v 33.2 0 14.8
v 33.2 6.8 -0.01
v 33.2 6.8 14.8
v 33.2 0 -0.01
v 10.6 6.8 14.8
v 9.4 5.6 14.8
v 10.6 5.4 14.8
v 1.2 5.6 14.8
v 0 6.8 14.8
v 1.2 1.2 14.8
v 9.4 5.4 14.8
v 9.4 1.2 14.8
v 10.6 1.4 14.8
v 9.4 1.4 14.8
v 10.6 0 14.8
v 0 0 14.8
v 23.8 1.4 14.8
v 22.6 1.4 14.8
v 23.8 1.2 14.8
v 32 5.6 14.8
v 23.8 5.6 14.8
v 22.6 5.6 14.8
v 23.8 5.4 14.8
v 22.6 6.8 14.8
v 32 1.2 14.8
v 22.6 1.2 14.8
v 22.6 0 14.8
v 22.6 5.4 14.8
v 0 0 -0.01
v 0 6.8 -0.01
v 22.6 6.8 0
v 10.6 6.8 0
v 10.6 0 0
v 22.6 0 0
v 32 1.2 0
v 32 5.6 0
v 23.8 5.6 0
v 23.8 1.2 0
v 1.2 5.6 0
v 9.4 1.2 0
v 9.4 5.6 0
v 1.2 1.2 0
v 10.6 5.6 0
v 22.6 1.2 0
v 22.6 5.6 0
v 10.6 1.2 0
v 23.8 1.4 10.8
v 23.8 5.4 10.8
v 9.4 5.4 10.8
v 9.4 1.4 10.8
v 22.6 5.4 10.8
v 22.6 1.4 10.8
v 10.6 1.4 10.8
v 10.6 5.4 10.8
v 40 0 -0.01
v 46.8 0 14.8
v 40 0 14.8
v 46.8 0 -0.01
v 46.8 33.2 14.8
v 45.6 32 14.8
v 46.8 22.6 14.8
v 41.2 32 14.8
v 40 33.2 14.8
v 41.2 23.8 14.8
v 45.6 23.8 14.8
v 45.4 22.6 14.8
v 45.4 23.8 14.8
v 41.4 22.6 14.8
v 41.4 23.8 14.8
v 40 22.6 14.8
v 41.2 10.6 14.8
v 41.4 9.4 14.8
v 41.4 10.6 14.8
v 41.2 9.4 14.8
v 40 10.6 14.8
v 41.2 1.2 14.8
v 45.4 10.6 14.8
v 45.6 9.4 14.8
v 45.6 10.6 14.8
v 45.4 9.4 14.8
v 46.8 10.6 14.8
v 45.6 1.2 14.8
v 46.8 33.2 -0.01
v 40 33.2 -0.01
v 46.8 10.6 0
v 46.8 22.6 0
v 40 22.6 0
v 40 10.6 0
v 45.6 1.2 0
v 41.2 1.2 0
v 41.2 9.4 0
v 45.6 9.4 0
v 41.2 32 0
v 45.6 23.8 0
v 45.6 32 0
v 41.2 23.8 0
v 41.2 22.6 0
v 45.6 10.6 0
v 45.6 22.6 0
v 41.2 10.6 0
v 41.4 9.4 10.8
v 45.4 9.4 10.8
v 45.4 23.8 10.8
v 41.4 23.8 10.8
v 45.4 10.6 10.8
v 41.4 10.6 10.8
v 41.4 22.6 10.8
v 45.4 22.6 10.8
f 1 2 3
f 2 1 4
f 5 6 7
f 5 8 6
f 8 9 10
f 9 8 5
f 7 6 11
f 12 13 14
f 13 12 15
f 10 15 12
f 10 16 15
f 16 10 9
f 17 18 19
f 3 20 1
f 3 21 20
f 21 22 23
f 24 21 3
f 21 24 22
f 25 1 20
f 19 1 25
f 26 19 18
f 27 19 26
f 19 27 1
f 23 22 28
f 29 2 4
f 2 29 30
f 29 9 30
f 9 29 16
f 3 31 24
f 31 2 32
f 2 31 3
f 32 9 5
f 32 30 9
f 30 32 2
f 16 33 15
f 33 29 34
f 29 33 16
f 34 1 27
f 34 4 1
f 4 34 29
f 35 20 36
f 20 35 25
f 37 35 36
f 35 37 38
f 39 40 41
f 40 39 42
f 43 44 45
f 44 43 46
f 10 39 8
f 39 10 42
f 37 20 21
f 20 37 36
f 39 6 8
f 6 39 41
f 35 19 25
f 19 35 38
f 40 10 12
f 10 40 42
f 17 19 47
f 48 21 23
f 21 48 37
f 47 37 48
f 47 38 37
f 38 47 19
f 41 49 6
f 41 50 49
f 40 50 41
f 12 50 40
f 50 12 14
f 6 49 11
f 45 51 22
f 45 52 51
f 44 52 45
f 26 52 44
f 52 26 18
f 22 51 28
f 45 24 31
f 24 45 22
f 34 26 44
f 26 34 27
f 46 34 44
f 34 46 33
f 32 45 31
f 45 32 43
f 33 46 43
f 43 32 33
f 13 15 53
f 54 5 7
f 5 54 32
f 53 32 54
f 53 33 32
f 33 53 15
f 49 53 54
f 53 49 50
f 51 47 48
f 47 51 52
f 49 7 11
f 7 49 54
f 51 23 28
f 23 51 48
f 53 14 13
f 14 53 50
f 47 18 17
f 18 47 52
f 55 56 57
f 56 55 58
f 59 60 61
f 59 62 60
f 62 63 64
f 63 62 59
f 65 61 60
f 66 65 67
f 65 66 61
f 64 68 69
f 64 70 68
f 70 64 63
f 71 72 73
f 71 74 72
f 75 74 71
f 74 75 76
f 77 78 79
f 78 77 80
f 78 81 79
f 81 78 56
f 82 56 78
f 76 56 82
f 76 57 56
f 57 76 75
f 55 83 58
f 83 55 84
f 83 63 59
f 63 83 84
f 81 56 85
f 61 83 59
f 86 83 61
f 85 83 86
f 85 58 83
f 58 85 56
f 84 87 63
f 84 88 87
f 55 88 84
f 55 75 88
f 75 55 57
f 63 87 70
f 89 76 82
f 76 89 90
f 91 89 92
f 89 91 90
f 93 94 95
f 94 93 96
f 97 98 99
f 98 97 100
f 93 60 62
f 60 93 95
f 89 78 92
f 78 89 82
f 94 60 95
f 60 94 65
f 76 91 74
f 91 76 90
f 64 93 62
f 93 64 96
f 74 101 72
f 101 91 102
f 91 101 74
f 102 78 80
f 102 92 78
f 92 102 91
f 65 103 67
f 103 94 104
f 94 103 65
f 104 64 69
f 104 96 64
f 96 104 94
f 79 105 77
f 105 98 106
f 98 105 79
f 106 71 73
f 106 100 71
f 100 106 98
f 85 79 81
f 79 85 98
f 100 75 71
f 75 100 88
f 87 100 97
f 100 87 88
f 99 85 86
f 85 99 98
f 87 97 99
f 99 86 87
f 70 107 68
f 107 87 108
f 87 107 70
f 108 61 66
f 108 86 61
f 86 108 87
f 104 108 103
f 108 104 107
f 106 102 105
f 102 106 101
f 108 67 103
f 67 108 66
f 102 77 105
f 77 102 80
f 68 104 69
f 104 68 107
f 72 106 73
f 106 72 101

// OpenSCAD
// file: ../../Base/Boxes.scad
// Fischertechnik Box Foundation
// Pre-designed Boxes

use <Constants.scad>

include <PlacementOptions.scad>

box190Width = 190;
box190Depth = 130;
box130Width = 130;
box130Depth = 95;
boxUsageHeight = 33.9;
boxWallThickness = 2.4;
boxBaseThickness = 1.0;

// getBoxWallThickness()
// Gets the wall thickness of a Fischertechnik Box

function getBoxWallThickness() = boxWallThickness;

// Gets the usable height of a fischertechnik box
function getBoxUsageHeight() = boxUsageHeight;

// Gets the thickness of the Fischertechnik box base.
function getBoxBaseThickness() = boxBaseThickness;

// Gets the usable inner space of a Box 190 as an x/y-list
function getBox190Space() = [
    box190Width - 2*getBoxWallThickness(), 
    box190Depth - 2*getBoxWallThickness() ];

// Imports the Fischertechnik empty box 130x190 mm and places it at position 0,0
// 190x130 are the outer sizes, the inner space is slightly smaller. Use getBox190Space() to get the inner sizes.
// This module needs the STL file "Fischertechnik Box 130x190.stl" in the library path.
// The box is positioned that the usable inner space is at the 0,0,0 position. The

module Box190() {
    translate([-getBoxWallThickness(),-getBoxWallThickness(),-getBoxBaseThickness()])
        import("Fischertechnik Box 130x190.stl", convexity=3);
}

// Gets the usable inner space of a Box 130 as an x/y-list
function getBox130Space() = [
    box130Width - 2*getBoxWallThickness(), 
    box130Depth - 2*getBoxWallThickness() ];

// Imports the Fischertechnik empty box 95x130 mm and places it at position 0,0
// 190x130 are the outer sizes, the inner space is slightly smaller. Use getBox190Space() to get the inner sizes.
// This module needs the STL file "Fischertechnik Box 95x130.stl" in the library path.
// The box is positioned that the usable inner space is at the 0,0,0 position. The

module Box130() {
    translate([-getBoxWallThickness(),-getBoxWallThickness(),-getBoxBaseThickness()])
        import("Fischertechnik Box 95x130.stl", convexity=3);
}

// Creates a web at the specified box walls
// corner 0 = LowerLeft, 1 = UpperLeft, 2 = UpperRight, 3 = LowerRight
// side 0 = LeftOfCorner, 1 = RightOfCorner
// distance = Distance in mm from the corner
// box = inner width and depth of the box (default: Box 190)
// webWidth = length of the web (default is 3 mms)
// webThickness = thickness of the web (default is 1 mm)

module BoxWeb(corner, side, distance, box=getBox190Space(), webWidth=3, webThickness=1.0) {
    sink = getBoxWallThickness()/2;

    width = (corner % 2 == 0) ? 
            (side == LeftOfCorner ? webWidth : webThickness) :
            (side == LeftOfCorner ? webThickness : webWidth);

    depth = (corner % 2 == 0) ? 
            (side == RightOfCorner ? webWidth : webThickness) :
            (side == RightOfCorner ? webThickness : webWidth);
    
    xDiff = corner == LowerLeft ? 
                (side == LeftOfCorner ? -sink : distance) :
            (corner == UpperLeft ?                
                (side == LeftOfCorner ? distance : -sink) :
            (corner == UpperRight ?
                (side == LeftOfCorner ? box.x-webWidth+sink : box.x-distance-webThickness) :
                (side == LeftOfCorner ? box.x-distance-webThickness: box.x-webWidth+sink)));

    yDiff = corner == LowerLeft ? 
                (side == RightOfCorner ? -sink : distance) :
            (corner == UpperLeft ?
                (side == RightOfCorner ? box.y-distance : box.y-webWidth+sink) :
            (corner == UpperRight ?
                (side == RightOfCorner ? box.y-webWidth+sink : box.y-distance) :
                (side == RightOfCorner ? distance : -sink)));
    
    translate([xDiff, yDiff, -getExcess()])
        cube([width, depth, boxUsageHeight + 2*getExcess()]);
}
// file: ../../Base/Rotation.scad
// Fischertechnik Box Foundation
// Geometry Helpers Rotation

include <PlacementOptions.scad>

// getRotatedSpace(space, rotation=NoRotation)
// Rotates the space dependent on the specified rotation

function getRotatedSpace(space, rotation=NoRotation) = [
    (rotation == Rotate90 || rotation == Rotate270) ? space.y : space.x,
    (rotation == Rotate90 || rotation == Rotate270) ? space.x : space.y
];

// Rotates the given space around the fixed left lower corner
// space = the space the children needs as width/depth list [width,depth]
// rotation = 0 Rotate0 degrees, 1 Rotate90 degrees, 2 Rotate180 degrees, 3 Rotate270 degrees (equivalent to -90)

module RotateFix(space, rotation=Rotate0) {
    dy = (rotation == Rotate0 || rotation == Rotate270) ? 0 :
        (rotation == Rotate90) ? space.x :
        space.y;
    dx = (rotation < Rotate180) ? 0 :
        (rotation == Rotate180) ? space.x :
        space.y;
    
    translate([dx, dy, 0])
        rotate([0, 0, rotations[rotation]])
            children();
}
// file: ../../Base/Alignment.scad
// Fischertechnik Box Foundation
// Geometry Helpers Alignment

include <PlacementOptions.scad>

// getAlignedX(elementWidth, spaceWidth, align=AlignRight, offset=0)
// Gets the aligned X offset of an element with the given
// width in the given space.
// elementWidth = The width of the element to positon
// spaceWidth = The space where the element should be aligned
// align = 0 AlignLeft, 1 AlignCenter, 2 AlignRight
// offset = an optional offset from the aligned position. When
// aligned left or centered, then positive values are in X direction.
// When aligned right then positive values are in negative X direction.

function getAlignedX(elementWidth, spaceWidth, align=AlignRight, offset=0) =
    (align == AlignLeft) ?
        offset :
        ((align == AlignCenter) ?
        (spaceWidth - elementWidth)/2 + offset :
        spaceWidth - offset - elementWidth);

// getAlignedY(elementDepth, spaceDepth, align=AlignTop, offset=0)
// Gets the aligned Y offset of an element with the given
// depth in the given space.
// elementDepth = The depth of the element to positon
// spaceDepth = The space where the element should be aligned
// align = 0 AlignBottom, 1 AlignCenter, 2 AlignTop
// offset = an optional offset from the aligned position. When
// aligned bottom or centered, then positive values are in Y direction.
// When aligned top then positive values are in negative Y direction.

function getAlignedY(elementDepth, spaceDepth, align=AlignTop, offset=0) =
    (align == AlignBottom) ?
        offset :
        ((align == AlignCenter) ?
        (spaceDepth - elementDepth)/2 + offset :
        spaceDepth - offset - elementDepth);
// file: ../../Base/Constants.scad
// Fischertechnik Box Foundation
// Constants

// Constant values necessary for multiple elements

// Base constants
dividerThickness = 1.2;
excess = 0.01;
fragments = 90;
tolerance = 0.8;

// Gets the thickness of a divider 
function getDividerThickness() = dividerThickness;

// Gets the excess that is used to merge walls into each other
function getExcess() = excess;

// Gets amount of fragments of a cylinder
function getFragments() = fragments;

// Gets the inner tolerance of a frame to each side
function getTolerance() = tolerance;


// Fischertechnik specific constants
axisDiameter = 4;
axisBottomDiameter = axisDiameter + 1;
standardEdgeDistance = 2.5;
standardWebDistance = 11.5;
standardCornerLength = 15;
tubeWallFactor = 1.6;

// Gets axis diameter
function getAxisDiameter() = axisDiameter;

// Gets axis bottom diameter for thicker part at the bottom
function getAxisBottomDiameter() = axisBottomDiameter;

// gets the standard distance to the wall of the box for dockable frames with webs
function getStandardEdgeDistance() = standardEdgeDistance;

// gets the standard distance of each web to the corner of the dockable frame
function getStandardWebDistance() = standardWebDistance;

// gets the standard length of the corner walls of a dockable frame
function getStandardCornerLength() = standardCornerLength;

// gets the wall thickness of a tube.
function getTubeWallThickness() = tubeWallFactor * getDividerThickness();
// file: ../../Base/PlacementOptions.scad
// Fischertechnik Box Foundation
// Placement Options

// Alignment
NoAlign = 0;
AlignLeft = 1;
AlignBottom = 2;
AlignCenter = 3;
AlignRight = 4;
AlignTop = 5;

// Element rotation degree steps
rotations = [0, -90, -180, -270];

// Rotation
NoRotation = 0;
Rotate0 = 0;
Rotate90 = 1;
Rotate180 = 2;
Rotate270 = 3;

// Docking (seen from above)
NoDock = -1;
DockLeft = 0;
DockTop = 1;
DockRight = 2;
DockCorner = 2;
DockBottom = 3;

// Web corners
LowerLeft = 0;
UpperLeft = 1;
UpperRight = 2;
LowerRight = 3;

// Web position relative to corner
LeftOfCorner = 0;
RightOfCorner = 1;
// file: ../../Elements/FrameAxis30.scad
// Fischertechnik Box Library
// Frame for single 30 mm Axis
// 31034

use <../Base/Constants.scad>
use <../ModelBase/Complex.scad>

length = 30;

// getFrameAxis30Space()
// Gets the width (.x) and depth (.y) of the axis frame.

function getFrameAxis30Space() = getFrameAxisSpace(length);

// FrameAxis30()
// Axis holder for a single 30 mm axis.

module FrameAxis30() {
    FrameAxis(length);
}

// Test
color("lightgray")
FrameAxis30();
// file: ../../Base/Placement.scad
// Fischertechnik Box Foundation
// Geometry Helpers Placement

use <Constants.scad>
use <Alignment.scad>
use <Rotation.scad>
use <Boxes.scad>

include <PlacementOptions.scad>

// Place(x=0, y=0, elementSpace=[0,0], alignX=AlignLeft, alignY=AlignBottom, rotation=Rotate0, boxSpace=getBox190Space())
// Places the child at the specified position
// y = Y-Position. This is a relative position when an X aligment is specified.
// x = X-Position. This is a relative position when an Y aligment is specified.
// elementSpace = space of the element to be placed [x,y]
// alignX = -1=NoAlign, 0 AlignLeft, 1 AlignCenter, 3 AlignRight (elementSpace and boxSpace required!)
// alignY = -1=NoAlign, 2 AlignBottom, 1 AlignCenter, 4 AlignTop (elementSpace and boxSpace required!)
// rotation = 0 Rotate0 0 degrees, 1 Rotate90 90 degrees, 
// 2 Rotate180 180 degrees, 3 Rotate270 270 degrees (equivalent to -90)
// boxSpace = Inner space of the box where the placement occurs [x,y] - default is Box 190x130 inner space

module Place(x=0, y=0, elementSpace=[0,0], 
  alignX=AlignLeft, alignY=AlignBottom, 
  rotation=NoRotation, boxSpace=getBox190Space()) {

    module Position(x, y, space, rotation=Rotate0) {
        translate([x, y, 0])
            RotateFix(space, rotation)
                children(0);
    }

    space = getRotatedSpace(elementSpace, rotation);
    alignedX = getAlignedX(space.x, boxSpace.x, alignX, x);
    alignedY = getAlignedY(space.y, boxSpace.y, alignY, y);
    Position(alignedX, alignedY, elementSpace, rotation)
        children(0);
}

// Center(space=getBox130Space(), elementSpace=[0,0])
// space = Space where the children is centered. For cylinder use centered=true and no elementSpace.
// elementSpace = space of the element to be centered [x,y]

module Center(space=getBox190Space(), elementSpace=[0,0]) {
    translate([(space.x - elementSpace.x) / 2, (space.y - elementSpace.y) / 2])
        children(0);
}

// CenterHorizontal(width=0, y=0, offset=0, space=getBox130Space())
// space = Space where the children is centered. For cylinder use centered=true and no elementSpace.
// elementSpace = space of the element to be centered [x,y]

module CenterHorizontal(width=0, y=0, offset=0, space=getBox190Space()) {
    translate([(space.x - width) / 2 + offset, y])
        children(0);
}

// CenterVertical(depth=0, x=0, offset=0, space=getBox130Space())
// space = Space where the children is centered. For cylinder use centered=true and no elementSpace.
// elementSpace = space of the element to be centered [x,y]

module CenterVerticalal(depth=0, x=0, offset=0, space=getBox190Space()) {
    translate([x, (space.y - depth) / 2 + offset])
        children(0);
}
// main file
// Fischertechnik Box Foundation
// Elements
// Test FrameAxis30

use <../../Base/Placement.scad>
use <../../Elements/FrameAxis30.scad>

include <../../Base/PlacementOptions.scad>

FrameAxis30();

Place(40, 0, elementSpace=getFrameAxis30Space(), rotation=Rotate90)
    FrameAxis30();
